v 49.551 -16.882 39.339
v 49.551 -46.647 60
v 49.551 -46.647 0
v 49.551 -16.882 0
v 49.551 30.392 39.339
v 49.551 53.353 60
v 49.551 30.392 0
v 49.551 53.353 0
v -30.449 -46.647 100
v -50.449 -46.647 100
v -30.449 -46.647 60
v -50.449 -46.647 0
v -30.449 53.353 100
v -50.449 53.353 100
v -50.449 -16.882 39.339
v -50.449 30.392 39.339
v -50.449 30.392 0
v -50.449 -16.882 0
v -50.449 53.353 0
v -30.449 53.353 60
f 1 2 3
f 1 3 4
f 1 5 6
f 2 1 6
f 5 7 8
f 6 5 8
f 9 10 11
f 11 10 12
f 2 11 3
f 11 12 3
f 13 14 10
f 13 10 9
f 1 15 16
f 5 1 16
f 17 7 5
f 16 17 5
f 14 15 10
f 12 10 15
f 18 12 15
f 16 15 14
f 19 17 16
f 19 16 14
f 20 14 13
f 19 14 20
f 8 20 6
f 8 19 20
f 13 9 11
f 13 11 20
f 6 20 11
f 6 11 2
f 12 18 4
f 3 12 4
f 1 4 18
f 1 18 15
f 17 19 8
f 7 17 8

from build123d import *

# Parameters (mm, degrees)
F0_W     = 100
F0_H     = 100
F1_DEPTH = 100
F2_W     = 80
F2_H     = 100
F3_DEPTH = 40
F4_W     = 47.27444
F4_H     = 39.339293
F5_DEPTH = 100.001


with BuildPart() as f1:
    # F0 (on Top) → F1 (new body)
    with BuildSketch(Plane.XY):
        with Locations((-0.449351, 3.352783)):
            Rectangle(F0_W, F0_H)
    extrude(amount=F1_DEPTH)

    # F2 (on face) → F3 (cut)
    with BuildSketch(Plane.XY.offset(100)):
        with Locations((9.550649, 3.352783)):
            Rectangle(F2_W, F2_H)
    extrude(amount=-F3_DEPTH, mode=Mode.SUBTRACT)

    # F4 (on face) → F5 (cut, through all)
    with BuildSketch(Plane.YZ.offset(49.550649)):
        with Locations((6.754881, 19.669646)):
            Rectangle(F4_W, F4_H)
    extrude(amount=-F5_DEPTH, mode=Mode.SUBTRACT)


solid = f1.part
